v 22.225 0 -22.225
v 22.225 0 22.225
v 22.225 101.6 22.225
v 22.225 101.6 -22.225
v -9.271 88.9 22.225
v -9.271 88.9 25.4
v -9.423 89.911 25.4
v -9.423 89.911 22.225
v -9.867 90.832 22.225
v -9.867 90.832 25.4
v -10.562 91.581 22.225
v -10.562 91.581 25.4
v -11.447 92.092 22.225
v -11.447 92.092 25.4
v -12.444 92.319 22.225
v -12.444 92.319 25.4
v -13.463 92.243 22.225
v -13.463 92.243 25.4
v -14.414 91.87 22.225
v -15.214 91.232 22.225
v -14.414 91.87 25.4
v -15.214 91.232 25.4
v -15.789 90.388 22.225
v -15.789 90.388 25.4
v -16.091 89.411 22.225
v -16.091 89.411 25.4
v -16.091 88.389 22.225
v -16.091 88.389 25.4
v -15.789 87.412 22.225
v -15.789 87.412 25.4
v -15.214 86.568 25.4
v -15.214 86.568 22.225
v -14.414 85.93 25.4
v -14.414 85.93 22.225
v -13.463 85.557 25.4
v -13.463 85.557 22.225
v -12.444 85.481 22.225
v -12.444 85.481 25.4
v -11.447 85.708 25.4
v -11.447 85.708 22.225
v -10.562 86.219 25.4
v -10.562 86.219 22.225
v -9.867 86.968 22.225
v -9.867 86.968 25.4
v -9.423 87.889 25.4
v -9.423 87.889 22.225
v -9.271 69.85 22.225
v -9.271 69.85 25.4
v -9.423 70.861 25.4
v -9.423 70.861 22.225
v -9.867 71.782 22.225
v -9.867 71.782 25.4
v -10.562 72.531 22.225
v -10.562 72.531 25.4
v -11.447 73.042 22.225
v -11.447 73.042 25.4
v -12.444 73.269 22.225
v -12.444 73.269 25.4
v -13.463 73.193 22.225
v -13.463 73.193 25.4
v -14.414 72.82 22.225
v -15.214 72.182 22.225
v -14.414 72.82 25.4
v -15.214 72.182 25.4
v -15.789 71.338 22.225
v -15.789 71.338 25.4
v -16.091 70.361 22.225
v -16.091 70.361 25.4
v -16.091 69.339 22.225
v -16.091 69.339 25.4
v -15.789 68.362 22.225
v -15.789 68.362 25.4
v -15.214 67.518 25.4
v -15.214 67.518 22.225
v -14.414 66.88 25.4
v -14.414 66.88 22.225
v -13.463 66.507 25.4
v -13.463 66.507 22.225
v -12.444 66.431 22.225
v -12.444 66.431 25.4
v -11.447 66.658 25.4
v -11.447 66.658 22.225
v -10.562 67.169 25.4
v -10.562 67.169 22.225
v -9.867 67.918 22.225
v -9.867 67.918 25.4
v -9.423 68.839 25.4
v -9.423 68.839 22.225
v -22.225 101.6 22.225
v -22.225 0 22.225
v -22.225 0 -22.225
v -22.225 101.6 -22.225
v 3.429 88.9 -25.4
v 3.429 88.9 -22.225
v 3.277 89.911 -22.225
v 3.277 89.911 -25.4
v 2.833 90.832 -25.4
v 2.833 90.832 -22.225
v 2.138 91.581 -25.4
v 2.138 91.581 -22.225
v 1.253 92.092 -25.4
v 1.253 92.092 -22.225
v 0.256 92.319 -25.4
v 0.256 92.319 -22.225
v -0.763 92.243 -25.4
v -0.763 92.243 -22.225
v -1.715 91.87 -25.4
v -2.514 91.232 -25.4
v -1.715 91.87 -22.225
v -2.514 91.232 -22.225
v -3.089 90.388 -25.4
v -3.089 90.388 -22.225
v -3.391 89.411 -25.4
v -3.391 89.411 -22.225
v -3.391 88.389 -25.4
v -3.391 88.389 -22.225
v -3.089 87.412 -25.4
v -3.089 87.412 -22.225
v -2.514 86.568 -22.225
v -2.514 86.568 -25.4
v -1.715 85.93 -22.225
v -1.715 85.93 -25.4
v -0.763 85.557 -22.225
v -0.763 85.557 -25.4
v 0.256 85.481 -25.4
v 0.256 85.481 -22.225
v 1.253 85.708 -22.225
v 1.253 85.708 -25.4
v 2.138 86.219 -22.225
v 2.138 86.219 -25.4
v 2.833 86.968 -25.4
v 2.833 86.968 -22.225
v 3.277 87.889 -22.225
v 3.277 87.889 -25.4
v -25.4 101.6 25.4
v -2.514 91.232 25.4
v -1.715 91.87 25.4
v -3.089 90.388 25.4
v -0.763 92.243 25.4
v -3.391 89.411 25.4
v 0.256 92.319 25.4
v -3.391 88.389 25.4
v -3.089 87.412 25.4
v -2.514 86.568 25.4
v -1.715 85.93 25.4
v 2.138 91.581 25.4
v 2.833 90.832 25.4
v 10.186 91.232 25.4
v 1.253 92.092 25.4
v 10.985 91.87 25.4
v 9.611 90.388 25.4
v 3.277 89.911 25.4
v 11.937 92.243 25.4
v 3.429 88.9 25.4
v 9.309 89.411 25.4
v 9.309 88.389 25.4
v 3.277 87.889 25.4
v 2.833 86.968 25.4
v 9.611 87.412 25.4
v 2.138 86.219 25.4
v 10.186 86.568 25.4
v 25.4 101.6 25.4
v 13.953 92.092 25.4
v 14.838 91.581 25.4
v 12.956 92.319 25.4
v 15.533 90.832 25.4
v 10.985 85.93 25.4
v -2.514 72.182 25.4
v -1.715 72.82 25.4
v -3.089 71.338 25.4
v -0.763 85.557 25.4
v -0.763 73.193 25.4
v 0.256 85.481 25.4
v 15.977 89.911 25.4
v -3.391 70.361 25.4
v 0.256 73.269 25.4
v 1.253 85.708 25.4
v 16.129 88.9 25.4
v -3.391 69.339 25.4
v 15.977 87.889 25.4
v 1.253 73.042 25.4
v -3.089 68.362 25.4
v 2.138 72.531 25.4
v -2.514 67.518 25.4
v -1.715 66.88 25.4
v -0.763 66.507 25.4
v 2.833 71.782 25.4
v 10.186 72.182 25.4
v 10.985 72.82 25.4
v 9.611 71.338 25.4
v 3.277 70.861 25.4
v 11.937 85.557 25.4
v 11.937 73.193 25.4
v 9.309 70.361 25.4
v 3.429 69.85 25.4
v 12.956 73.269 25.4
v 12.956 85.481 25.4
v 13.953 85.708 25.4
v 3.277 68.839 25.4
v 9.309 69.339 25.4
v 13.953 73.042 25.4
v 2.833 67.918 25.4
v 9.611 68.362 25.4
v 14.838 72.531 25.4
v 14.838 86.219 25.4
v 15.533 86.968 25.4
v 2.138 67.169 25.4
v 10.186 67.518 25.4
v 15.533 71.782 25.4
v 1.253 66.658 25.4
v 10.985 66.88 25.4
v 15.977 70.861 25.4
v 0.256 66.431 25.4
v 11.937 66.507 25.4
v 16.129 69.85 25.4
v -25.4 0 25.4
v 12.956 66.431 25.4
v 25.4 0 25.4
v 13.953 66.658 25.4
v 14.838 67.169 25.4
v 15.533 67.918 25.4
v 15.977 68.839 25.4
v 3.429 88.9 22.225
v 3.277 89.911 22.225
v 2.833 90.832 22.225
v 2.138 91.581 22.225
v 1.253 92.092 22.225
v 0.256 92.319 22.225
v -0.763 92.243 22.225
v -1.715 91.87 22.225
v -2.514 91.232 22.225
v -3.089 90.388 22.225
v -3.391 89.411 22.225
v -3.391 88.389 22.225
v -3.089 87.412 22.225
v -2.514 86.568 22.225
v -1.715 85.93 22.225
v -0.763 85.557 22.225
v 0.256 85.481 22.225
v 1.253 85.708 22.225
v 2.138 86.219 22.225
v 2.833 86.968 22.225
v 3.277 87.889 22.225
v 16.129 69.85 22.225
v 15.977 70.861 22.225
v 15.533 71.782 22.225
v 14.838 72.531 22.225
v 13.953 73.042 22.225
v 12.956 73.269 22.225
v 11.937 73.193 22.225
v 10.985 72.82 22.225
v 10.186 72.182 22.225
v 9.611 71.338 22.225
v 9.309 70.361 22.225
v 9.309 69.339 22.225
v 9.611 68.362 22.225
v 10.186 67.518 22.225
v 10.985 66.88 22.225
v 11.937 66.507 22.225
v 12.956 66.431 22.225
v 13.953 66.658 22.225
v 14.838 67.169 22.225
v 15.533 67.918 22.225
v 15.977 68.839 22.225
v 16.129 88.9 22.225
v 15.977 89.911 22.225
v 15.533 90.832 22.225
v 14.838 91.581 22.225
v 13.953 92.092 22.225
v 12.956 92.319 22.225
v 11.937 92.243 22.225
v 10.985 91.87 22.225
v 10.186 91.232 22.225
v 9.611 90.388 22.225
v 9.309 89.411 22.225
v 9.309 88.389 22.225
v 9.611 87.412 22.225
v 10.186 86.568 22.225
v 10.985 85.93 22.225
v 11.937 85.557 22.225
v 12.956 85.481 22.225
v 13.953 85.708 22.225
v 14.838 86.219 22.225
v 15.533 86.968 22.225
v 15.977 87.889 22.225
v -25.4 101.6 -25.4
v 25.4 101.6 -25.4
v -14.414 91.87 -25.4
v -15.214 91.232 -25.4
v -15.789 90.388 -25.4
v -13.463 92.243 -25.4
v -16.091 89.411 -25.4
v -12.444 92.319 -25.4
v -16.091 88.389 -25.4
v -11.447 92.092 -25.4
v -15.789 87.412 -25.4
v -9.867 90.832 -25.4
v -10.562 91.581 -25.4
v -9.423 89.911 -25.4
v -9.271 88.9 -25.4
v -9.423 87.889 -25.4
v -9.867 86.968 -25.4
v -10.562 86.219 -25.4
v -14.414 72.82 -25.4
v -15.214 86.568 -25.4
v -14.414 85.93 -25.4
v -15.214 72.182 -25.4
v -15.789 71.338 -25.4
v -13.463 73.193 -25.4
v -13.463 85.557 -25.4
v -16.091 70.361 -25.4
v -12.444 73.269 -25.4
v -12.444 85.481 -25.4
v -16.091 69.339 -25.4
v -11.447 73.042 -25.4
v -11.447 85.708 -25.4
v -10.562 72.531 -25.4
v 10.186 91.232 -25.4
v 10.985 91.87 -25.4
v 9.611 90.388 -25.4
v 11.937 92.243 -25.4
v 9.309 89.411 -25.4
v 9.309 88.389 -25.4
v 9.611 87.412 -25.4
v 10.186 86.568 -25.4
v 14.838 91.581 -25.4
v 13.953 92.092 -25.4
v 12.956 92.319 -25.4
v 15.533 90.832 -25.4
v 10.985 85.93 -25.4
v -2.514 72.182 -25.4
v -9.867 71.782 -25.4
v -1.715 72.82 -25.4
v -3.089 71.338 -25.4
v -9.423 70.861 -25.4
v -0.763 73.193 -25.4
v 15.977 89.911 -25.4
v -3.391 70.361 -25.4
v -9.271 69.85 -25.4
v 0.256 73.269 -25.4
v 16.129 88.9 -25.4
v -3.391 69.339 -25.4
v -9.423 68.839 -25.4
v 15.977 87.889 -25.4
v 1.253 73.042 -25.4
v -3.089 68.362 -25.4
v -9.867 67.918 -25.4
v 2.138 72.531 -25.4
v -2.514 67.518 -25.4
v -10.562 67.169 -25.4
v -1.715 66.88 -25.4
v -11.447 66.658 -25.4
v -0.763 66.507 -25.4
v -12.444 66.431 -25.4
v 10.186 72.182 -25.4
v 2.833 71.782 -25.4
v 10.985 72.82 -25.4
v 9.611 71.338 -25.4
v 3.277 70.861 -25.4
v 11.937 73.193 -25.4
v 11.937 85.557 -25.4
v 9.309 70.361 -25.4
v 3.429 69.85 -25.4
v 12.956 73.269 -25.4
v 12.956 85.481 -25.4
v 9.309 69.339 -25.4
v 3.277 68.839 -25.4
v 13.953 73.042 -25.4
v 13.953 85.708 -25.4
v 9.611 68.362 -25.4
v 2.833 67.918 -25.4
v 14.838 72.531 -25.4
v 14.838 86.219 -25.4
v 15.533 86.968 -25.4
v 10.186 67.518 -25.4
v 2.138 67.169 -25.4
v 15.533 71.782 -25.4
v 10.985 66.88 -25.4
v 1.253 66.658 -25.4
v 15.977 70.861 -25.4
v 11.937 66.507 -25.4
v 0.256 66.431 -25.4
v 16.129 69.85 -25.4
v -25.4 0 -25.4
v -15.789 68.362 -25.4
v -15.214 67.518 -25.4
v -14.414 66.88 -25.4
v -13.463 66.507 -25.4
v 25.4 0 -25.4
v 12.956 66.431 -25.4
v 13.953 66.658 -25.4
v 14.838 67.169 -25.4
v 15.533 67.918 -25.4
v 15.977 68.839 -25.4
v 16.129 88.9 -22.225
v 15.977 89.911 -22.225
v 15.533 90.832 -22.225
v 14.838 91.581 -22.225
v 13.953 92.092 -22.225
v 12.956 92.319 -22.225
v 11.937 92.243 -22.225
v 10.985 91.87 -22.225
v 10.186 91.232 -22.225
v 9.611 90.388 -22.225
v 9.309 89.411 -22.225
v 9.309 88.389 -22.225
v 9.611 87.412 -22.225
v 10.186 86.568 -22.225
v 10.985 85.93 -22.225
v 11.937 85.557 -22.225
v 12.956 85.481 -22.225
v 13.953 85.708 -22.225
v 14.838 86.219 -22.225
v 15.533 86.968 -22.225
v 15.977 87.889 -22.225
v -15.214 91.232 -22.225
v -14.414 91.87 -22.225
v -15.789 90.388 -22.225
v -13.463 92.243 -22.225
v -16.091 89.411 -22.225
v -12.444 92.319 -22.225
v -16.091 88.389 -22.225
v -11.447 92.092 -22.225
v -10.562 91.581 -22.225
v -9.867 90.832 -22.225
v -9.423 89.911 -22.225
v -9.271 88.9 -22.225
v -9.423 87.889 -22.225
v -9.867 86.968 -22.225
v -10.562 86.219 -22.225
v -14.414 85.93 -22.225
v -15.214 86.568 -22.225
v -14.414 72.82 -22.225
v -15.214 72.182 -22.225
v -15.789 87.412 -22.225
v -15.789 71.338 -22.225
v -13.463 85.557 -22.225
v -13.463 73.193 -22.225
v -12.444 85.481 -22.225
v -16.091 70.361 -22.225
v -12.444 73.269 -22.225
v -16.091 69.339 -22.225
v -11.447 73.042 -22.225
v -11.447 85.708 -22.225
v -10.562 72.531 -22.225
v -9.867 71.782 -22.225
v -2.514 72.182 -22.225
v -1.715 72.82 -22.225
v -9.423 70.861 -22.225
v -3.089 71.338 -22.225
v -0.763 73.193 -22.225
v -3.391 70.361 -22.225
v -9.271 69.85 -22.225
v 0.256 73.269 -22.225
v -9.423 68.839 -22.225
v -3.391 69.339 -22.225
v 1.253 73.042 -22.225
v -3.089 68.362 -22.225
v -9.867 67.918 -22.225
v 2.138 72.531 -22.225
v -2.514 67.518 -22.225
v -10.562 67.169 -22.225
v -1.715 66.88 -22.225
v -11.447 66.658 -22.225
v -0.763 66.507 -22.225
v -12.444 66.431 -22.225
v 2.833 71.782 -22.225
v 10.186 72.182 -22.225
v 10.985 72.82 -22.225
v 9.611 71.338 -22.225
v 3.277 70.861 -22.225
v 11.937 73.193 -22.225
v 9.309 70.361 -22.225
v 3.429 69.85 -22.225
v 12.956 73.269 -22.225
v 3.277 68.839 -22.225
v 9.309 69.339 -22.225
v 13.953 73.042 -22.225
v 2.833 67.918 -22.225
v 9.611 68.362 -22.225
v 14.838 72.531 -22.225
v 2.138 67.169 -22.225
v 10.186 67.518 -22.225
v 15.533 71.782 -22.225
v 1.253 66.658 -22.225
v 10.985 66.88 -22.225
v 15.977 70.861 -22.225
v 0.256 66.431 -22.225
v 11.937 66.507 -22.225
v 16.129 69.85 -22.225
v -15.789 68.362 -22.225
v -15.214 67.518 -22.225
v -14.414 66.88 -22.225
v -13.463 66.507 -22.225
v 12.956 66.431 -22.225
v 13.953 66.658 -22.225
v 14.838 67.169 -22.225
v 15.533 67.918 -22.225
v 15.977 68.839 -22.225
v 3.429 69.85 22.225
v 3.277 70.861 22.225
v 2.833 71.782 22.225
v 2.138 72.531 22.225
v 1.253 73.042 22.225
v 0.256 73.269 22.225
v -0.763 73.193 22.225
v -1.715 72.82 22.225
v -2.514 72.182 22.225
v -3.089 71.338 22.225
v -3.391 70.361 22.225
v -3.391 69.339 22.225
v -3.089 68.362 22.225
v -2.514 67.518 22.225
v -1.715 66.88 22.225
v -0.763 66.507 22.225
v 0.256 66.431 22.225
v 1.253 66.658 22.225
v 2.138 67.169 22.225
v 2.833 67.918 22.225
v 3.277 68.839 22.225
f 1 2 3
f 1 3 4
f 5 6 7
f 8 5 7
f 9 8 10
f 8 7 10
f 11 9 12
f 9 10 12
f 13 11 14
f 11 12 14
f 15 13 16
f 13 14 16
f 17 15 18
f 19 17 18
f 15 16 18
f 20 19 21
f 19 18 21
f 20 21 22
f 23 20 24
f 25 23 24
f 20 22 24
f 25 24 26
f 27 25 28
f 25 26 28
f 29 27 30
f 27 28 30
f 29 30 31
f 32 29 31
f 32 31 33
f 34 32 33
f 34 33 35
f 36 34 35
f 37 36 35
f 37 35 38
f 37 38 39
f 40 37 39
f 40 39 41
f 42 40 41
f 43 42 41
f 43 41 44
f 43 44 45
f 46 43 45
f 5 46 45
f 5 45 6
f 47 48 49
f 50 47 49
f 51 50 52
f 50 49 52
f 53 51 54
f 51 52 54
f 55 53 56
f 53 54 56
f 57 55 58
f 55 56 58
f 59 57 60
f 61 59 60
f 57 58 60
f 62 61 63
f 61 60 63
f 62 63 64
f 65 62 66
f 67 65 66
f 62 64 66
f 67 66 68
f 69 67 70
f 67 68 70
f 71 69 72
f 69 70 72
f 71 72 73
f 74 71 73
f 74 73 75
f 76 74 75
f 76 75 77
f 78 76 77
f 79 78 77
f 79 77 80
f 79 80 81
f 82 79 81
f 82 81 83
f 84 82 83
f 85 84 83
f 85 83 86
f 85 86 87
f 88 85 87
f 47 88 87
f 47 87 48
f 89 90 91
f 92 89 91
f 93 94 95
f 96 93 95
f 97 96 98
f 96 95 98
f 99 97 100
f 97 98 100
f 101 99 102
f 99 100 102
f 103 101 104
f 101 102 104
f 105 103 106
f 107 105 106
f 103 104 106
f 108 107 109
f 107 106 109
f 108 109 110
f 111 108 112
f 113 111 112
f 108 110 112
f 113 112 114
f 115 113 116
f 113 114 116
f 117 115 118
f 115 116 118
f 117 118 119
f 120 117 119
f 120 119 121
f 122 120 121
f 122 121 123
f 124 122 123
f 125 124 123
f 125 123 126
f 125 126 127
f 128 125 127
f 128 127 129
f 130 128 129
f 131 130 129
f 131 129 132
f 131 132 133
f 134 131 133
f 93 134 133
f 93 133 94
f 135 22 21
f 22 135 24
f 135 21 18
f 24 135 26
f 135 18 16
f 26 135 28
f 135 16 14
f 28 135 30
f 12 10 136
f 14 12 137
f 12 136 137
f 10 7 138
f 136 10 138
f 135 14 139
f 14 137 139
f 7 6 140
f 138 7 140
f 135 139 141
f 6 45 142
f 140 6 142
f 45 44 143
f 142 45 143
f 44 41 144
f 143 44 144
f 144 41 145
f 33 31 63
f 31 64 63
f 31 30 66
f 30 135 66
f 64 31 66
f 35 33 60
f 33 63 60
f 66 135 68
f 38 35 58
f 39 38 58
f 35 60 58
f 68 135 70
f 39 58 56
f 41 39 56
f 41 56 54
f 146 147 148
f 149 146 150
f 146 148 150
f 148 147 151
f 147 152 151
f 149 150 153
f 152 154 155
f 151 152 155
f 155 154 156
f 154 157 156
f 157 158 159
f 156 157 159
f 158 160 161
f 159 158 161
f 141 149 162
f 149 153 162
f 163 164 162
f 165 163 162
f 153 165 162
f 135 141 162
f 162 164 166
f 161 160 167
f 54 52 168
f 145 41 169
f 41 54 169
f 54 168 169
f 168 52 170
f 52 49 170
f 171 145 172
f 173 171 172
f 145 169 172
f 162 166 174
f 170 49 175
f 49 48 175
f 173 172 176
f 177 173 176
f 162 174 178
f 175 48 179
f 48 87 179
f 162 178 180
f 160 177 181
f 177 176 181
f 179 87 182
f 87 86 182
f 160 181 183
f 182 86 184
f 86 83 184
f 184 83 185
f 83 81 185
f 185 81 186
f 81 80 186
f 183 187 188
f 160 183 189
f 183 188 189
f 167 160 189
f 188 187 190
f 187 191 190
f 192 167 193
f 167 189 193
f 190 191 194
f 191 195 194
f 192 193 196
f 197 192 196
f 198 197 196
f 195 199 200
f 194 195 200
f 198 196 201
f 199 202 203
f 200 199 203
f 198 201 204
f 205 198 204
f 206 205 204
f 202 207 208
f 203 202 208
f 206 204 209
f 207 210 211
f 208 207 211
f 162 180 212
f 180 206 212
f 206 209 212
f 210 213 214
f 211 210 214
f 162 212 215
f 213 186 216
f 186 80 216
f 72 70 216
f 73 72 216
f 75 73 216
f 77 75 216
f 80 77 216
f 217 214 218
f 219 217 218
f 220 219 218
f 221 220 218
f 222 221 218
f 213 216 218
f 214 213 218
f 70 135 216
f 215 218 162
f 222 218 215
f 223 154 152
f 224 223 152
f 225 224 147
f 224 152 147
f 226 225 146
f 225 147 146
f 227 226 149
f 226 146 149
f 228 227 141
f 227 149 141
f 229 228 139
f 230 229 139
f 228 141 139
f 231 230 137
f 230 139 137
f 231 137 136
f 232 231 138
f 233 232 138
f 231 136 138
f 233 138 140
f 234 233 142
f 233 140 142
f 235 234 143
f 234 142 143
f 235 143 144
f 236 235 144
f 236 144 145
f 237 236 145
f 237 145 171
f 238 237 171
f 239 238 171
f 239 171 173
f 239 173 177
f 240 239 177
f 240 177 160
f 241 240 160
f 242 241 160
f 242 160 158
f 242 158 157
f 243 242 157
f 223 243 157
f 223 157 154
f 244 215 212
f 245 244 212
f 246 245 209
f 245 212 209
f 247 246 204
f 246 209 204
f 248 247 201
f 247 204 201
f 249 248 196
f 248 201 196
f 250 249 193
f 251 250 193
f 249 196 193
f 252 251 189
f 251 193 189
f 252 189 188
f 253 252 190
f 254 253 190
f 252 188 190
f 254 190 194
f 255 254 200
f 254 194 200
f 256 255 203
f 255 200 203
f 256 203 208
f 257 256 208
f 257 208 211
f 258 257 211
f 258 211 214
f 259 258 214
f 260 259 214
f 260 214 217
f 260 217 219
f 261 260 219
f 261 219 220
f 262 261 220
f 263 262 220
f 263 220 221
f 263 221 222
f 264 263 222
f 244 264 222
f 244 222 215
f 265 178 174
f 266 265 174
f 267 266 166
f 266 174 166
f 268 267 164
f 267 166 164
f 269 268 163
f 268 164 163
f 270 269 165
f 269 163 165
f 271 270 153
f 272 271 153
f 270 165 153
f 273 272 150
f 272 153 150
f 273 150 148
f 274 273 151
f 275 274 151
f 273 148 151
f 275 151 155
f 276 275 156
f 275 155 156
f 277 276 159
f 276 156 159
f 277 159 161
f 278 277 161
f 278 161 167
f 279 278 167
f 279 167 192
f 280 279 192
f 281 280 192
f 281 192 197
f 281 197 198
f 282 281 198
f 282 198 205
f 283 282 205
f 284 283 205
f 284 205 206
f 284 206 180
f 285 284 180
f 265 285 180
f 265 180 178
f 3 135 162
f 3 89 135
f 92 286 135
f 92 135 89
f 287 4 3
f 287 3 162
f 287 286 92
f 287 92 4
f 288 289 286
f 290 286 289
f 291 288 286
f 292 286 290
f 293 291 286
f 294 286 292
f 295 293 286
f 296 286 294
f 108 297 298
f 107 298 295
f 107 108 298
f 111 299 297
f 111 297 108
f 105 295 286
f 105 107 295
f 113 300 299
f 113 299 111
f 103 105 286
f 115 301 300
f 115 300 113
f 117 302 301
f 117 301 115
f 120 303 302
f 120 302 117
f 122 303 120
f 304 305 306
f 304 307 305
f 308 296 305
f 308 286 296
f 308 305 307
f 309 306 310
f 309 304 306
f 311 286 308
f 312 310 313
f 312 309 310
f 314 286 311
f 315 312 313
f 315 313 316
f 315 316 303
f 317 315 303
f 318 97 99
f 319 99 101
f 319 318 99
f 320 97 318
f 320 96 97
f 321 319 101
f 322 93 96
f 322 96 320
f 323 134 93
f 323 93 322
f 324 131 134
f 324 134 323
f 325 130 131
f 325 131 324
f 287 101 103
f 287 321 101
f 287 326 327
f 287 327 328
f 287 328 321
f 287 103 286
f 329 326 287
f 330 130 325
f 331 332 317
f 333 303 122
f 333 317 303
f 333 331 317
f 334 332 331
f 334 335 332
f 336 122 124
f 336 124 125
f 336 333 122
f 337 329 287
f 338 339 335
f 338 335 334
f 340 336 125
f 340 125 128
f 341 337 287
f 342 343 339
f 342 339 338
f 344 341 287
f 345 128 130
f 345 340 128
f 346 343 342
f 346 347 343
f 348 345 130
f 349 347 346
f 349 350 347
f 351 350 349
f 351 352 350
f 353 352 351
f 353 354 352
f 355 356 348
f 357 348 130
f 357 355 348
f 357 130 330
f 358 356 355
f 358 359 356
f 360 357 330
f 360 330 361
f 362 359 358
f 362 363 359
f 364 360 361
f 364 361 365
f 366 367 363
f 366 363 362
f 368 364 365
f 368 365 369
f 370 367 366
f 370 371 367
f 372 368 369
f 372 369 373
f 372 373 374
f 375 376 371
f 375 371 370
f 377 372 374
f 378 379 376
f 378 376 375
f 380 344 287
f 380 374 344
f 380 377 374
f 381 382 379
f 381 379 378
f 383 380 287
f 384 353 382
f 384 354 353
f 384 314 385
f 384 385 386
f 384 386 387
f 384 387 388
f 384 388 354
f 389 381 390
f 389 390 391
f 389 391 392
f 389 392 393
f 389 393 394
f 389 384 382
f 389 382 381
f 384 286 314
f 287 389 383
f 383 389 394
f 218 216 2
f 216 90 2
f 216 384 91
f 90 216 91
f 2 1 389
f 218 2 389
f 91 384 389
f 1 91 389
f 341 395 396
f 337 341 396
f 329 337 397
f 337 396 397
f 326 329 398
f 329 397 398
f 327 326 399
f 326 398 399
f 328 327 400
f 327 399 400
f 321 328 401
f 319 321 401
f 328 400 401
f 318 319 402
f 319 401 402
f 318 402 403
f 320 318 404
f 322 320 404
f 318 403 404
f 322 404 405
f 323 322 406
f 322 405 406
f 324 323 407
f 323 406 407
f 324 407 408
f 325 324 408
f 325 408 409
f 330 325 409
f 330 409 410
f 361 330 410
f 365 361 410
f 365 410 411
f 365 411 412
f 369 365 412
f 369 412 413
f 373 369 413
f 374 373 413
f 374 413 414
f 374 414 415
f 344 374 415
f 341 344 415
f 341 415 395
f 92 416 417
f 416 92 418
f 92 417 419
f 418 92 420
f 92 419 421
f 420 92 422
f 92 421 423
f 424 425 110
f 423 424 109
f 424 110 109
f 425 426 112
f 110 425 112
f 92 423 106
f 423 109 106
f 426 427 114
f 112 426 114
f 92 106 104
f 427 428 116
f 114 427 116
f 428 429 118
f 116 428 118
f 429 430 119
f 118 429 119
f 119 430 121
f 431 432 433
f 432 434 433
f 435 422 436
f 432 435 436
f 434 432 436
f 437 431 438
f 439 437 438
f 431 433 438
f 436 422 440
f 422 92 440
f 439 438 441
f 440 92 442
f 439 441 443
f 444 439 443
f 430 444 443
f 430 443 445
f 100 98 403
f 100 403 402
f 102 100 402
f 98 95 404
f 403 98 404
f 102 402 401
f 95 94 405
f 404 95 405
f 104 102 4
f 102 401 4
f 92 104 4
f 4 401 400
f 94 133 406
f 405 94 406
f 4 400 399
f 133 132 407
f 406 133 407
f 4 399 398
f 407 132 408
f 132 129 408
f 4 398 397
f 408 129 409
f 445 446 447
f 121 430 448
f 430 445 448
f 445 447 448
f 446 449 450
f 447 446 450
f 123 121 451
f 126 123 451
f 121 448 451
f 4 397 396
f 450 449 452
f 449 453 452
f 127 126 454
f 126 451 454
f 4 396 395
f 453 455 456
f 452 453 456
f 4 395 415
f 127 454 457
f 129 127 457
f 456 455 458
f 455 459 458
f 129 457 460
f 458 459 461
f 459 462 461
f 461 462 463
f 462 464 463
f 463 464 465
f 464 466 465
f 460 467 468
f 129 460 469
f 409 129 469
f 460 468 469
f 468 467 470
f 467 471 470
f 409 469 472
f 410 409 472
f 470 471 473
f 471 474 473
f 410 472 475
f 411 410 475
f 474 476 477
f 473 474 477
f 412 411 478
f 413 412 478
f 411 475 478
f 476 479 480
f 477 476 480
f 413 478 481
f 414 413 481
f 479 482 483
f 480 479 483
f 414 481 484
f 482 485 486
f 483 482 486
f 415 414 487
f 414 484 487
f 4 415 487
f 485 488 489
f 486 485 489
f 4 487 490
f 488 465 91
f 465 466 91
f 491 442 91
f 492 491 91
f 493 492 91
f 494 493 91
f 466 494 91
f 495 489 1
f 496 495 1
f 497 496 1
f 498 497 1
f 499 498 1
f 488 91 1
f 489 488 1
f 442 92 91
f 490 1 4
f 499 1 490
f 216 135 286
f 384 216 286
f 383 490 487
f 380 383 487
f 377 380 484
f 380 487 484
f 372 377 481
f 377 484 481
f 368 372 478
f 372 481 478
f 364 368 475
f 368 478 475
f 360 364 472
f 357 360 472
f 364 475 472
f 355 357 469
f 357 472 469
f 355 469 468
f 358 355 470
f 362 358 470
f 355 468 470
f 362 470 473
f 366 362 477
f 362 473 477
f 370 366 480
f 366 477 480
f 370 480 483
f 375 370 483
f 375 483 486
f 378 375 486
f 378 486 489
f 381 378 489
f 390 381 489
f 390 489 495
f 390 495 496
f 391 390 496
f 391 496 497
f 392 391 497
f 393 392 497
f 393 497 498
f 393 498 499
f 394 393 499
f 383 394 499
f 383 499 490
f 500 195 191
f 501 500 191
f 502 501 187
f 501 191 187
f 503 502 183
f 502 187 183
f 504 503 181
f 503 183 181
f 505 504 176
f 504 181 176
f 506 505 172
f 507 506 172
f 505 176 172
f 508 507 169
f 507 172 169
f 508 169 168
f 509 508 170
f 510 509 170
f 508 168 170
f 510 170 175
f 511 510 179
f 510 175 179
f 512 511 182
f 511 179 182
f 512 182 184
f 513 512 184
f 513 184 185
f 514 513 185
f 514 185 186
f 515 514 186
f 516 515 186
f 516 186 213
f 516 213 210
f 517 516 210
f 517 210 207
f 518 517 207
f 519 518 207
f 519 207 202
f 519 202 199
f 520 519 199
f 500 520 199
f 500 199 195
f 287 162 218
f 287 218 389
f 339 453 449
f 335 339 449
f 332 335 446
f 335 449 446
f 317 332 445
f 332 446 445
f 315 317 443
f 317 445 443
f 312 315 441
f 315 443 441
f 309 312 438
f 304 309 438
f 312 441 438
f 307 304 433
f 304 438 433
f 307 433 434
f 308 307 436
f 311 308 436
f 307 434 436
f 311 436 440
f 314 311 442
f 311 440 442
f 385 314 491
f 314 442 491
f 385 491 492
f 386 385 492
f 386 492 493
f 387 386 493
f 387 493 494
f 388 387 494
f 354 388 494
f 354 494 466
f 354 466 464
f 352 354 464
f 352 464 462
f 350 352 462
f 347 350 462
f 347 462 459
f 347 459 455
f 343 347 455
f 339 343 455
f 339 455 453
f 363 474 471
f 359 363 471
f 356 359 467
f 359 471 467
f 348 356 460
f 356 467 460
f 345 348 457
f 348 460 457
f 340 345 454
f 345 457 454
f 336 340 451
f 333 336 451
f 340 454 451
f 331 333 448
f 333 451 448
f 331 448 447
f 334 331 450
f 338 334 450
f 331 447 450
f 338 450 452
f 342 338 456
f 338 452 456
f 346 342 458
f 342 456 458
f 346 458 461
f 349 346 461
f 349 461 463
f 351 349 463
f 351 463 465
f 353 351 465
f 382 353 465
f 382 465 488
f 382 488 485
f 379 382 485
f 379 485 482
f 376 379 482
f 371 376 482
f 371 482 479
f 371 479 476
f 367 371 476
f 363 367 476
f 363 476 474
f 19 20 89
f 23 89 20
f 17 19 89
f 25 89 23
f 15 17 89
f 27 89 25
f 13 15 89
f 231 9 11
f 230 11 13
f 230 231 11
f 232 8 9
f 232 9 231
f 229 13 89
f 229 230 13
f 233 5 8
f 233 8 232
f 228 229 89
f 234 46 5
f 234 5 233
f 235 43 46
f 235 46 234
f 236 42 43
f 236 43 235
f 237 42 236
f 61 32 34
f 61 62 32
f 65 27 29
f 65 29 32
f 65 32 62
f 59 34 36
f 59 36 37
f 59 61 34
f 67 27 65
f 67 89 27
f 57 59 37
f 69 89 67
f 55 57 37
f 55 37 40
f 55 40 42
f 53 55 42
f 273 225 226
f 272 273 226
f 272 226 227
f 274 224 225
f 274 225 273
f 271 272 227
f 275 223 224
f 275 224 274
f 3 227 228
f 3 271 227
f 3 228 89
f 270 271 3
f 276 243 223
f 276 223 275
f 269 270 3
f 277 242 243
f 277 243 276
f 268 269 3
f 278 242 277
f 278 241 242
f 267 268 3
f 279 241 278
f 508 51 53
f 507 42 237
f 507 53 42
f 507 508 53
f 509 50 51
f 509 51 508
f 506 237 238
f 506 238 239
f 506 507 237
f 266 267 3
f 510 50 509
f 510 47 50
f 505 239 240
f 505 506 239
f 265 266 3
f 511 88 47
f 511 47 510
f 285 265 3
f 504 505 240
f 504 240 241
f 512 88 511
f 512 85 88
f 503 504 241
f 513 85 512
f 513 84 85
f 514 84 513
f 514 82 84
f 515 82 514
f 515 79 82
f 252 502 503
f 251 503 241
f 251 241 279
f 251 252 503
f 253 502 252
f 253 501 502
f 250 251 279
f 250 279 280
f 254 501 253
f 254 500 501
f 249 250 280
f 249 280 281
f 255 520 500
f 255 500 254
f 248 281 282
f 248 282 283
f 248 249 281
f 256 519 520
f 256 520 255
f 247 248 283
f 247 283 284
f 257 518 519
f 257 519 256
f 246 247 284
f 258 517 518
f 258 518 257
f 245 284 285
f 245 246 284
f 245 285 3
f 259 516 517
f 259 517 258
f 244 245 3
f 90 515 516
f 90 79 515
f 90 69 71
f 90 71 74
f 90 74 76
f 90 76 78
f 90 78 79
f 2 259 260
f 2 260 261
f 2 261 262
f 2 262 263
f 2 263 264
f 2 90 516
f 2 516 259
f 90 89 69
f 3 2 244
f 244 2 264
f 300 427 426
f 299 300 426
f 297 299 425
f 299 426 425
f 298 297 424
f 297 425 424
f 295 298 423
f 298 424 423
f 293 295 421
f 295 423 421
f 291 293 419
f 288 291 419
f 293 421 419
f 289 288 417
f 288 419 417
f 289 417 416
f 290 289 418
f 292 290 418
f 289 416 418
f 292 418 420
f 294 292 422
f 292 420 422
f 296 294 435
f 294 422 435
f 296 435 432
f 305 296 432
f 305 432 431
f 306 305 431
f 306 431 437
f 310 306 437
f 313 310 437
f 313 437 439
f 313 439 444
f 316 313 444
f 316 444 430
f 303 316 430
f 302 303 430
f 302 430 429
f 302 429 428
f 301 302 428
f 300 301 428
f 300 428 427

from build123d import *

# Parameters (mm, degrees)
SKETCH1_W            = 50.8
SKETCH1_H            = 50.8
SKETCH1_W_2          = 44.45
SKETCH1_H_2          = 44.45
BOSS_EXTRUDE1_DEPTH  = 101.6
SKETCH2_R            = 3.429
CUT_EXTRUDE1_DEPTH   = 101.6
LPATTERN1_COUNT      = 3
LPATTERN1_PITCH      = 12.7
LPATTERN1_COUNT_DIR2 = 2
LPATTERN1_PITCH_DIR2 = 19.05


with BuildPart() as part:
    # Sketch1 → Boss-Extrude1 (new body)
    with BuildSketch(Plane(origin=(0, 0, 0), x_dir=(1, 0, 0), z_dir=(0, 1, 0))):
        Rectangle(SKETCH1_W, SKETCH1_H)
        Rectangle(SKETCH1_W_2, SKETCH1_H_2, mode=Mode.SUBTRACT)
    extrude(amount=BOSS_EXTRUDE1_DEPTH)

    # Sketch2 → Cut-Extrude1 (cut)
    with BuildSketch(Plane.XY.offset(25.4)):
        with Locations((-12.7, 69.85)):
            Circle(SKETCH2_R)
    cut_extrude1 = extrude(amount=-CUT_EXTRUDE1_DEPTH, mode=Mode.SUBTRACT)

    # LPattern1: Cut-Extrude1 3 × 2
    with Locations(*[(i * LPATTERN1_PITCH, j * LPATTERN1_PITCH_DIR2, 0) for i in range(LPATTERN1_COUNT) for j in range(LPATTERN1_COUNT_DIR2) if (i, j) != (0, 0)]):
        add(cut_extrude1, mode=Mode.SUBTRACT)


solid = part.part
